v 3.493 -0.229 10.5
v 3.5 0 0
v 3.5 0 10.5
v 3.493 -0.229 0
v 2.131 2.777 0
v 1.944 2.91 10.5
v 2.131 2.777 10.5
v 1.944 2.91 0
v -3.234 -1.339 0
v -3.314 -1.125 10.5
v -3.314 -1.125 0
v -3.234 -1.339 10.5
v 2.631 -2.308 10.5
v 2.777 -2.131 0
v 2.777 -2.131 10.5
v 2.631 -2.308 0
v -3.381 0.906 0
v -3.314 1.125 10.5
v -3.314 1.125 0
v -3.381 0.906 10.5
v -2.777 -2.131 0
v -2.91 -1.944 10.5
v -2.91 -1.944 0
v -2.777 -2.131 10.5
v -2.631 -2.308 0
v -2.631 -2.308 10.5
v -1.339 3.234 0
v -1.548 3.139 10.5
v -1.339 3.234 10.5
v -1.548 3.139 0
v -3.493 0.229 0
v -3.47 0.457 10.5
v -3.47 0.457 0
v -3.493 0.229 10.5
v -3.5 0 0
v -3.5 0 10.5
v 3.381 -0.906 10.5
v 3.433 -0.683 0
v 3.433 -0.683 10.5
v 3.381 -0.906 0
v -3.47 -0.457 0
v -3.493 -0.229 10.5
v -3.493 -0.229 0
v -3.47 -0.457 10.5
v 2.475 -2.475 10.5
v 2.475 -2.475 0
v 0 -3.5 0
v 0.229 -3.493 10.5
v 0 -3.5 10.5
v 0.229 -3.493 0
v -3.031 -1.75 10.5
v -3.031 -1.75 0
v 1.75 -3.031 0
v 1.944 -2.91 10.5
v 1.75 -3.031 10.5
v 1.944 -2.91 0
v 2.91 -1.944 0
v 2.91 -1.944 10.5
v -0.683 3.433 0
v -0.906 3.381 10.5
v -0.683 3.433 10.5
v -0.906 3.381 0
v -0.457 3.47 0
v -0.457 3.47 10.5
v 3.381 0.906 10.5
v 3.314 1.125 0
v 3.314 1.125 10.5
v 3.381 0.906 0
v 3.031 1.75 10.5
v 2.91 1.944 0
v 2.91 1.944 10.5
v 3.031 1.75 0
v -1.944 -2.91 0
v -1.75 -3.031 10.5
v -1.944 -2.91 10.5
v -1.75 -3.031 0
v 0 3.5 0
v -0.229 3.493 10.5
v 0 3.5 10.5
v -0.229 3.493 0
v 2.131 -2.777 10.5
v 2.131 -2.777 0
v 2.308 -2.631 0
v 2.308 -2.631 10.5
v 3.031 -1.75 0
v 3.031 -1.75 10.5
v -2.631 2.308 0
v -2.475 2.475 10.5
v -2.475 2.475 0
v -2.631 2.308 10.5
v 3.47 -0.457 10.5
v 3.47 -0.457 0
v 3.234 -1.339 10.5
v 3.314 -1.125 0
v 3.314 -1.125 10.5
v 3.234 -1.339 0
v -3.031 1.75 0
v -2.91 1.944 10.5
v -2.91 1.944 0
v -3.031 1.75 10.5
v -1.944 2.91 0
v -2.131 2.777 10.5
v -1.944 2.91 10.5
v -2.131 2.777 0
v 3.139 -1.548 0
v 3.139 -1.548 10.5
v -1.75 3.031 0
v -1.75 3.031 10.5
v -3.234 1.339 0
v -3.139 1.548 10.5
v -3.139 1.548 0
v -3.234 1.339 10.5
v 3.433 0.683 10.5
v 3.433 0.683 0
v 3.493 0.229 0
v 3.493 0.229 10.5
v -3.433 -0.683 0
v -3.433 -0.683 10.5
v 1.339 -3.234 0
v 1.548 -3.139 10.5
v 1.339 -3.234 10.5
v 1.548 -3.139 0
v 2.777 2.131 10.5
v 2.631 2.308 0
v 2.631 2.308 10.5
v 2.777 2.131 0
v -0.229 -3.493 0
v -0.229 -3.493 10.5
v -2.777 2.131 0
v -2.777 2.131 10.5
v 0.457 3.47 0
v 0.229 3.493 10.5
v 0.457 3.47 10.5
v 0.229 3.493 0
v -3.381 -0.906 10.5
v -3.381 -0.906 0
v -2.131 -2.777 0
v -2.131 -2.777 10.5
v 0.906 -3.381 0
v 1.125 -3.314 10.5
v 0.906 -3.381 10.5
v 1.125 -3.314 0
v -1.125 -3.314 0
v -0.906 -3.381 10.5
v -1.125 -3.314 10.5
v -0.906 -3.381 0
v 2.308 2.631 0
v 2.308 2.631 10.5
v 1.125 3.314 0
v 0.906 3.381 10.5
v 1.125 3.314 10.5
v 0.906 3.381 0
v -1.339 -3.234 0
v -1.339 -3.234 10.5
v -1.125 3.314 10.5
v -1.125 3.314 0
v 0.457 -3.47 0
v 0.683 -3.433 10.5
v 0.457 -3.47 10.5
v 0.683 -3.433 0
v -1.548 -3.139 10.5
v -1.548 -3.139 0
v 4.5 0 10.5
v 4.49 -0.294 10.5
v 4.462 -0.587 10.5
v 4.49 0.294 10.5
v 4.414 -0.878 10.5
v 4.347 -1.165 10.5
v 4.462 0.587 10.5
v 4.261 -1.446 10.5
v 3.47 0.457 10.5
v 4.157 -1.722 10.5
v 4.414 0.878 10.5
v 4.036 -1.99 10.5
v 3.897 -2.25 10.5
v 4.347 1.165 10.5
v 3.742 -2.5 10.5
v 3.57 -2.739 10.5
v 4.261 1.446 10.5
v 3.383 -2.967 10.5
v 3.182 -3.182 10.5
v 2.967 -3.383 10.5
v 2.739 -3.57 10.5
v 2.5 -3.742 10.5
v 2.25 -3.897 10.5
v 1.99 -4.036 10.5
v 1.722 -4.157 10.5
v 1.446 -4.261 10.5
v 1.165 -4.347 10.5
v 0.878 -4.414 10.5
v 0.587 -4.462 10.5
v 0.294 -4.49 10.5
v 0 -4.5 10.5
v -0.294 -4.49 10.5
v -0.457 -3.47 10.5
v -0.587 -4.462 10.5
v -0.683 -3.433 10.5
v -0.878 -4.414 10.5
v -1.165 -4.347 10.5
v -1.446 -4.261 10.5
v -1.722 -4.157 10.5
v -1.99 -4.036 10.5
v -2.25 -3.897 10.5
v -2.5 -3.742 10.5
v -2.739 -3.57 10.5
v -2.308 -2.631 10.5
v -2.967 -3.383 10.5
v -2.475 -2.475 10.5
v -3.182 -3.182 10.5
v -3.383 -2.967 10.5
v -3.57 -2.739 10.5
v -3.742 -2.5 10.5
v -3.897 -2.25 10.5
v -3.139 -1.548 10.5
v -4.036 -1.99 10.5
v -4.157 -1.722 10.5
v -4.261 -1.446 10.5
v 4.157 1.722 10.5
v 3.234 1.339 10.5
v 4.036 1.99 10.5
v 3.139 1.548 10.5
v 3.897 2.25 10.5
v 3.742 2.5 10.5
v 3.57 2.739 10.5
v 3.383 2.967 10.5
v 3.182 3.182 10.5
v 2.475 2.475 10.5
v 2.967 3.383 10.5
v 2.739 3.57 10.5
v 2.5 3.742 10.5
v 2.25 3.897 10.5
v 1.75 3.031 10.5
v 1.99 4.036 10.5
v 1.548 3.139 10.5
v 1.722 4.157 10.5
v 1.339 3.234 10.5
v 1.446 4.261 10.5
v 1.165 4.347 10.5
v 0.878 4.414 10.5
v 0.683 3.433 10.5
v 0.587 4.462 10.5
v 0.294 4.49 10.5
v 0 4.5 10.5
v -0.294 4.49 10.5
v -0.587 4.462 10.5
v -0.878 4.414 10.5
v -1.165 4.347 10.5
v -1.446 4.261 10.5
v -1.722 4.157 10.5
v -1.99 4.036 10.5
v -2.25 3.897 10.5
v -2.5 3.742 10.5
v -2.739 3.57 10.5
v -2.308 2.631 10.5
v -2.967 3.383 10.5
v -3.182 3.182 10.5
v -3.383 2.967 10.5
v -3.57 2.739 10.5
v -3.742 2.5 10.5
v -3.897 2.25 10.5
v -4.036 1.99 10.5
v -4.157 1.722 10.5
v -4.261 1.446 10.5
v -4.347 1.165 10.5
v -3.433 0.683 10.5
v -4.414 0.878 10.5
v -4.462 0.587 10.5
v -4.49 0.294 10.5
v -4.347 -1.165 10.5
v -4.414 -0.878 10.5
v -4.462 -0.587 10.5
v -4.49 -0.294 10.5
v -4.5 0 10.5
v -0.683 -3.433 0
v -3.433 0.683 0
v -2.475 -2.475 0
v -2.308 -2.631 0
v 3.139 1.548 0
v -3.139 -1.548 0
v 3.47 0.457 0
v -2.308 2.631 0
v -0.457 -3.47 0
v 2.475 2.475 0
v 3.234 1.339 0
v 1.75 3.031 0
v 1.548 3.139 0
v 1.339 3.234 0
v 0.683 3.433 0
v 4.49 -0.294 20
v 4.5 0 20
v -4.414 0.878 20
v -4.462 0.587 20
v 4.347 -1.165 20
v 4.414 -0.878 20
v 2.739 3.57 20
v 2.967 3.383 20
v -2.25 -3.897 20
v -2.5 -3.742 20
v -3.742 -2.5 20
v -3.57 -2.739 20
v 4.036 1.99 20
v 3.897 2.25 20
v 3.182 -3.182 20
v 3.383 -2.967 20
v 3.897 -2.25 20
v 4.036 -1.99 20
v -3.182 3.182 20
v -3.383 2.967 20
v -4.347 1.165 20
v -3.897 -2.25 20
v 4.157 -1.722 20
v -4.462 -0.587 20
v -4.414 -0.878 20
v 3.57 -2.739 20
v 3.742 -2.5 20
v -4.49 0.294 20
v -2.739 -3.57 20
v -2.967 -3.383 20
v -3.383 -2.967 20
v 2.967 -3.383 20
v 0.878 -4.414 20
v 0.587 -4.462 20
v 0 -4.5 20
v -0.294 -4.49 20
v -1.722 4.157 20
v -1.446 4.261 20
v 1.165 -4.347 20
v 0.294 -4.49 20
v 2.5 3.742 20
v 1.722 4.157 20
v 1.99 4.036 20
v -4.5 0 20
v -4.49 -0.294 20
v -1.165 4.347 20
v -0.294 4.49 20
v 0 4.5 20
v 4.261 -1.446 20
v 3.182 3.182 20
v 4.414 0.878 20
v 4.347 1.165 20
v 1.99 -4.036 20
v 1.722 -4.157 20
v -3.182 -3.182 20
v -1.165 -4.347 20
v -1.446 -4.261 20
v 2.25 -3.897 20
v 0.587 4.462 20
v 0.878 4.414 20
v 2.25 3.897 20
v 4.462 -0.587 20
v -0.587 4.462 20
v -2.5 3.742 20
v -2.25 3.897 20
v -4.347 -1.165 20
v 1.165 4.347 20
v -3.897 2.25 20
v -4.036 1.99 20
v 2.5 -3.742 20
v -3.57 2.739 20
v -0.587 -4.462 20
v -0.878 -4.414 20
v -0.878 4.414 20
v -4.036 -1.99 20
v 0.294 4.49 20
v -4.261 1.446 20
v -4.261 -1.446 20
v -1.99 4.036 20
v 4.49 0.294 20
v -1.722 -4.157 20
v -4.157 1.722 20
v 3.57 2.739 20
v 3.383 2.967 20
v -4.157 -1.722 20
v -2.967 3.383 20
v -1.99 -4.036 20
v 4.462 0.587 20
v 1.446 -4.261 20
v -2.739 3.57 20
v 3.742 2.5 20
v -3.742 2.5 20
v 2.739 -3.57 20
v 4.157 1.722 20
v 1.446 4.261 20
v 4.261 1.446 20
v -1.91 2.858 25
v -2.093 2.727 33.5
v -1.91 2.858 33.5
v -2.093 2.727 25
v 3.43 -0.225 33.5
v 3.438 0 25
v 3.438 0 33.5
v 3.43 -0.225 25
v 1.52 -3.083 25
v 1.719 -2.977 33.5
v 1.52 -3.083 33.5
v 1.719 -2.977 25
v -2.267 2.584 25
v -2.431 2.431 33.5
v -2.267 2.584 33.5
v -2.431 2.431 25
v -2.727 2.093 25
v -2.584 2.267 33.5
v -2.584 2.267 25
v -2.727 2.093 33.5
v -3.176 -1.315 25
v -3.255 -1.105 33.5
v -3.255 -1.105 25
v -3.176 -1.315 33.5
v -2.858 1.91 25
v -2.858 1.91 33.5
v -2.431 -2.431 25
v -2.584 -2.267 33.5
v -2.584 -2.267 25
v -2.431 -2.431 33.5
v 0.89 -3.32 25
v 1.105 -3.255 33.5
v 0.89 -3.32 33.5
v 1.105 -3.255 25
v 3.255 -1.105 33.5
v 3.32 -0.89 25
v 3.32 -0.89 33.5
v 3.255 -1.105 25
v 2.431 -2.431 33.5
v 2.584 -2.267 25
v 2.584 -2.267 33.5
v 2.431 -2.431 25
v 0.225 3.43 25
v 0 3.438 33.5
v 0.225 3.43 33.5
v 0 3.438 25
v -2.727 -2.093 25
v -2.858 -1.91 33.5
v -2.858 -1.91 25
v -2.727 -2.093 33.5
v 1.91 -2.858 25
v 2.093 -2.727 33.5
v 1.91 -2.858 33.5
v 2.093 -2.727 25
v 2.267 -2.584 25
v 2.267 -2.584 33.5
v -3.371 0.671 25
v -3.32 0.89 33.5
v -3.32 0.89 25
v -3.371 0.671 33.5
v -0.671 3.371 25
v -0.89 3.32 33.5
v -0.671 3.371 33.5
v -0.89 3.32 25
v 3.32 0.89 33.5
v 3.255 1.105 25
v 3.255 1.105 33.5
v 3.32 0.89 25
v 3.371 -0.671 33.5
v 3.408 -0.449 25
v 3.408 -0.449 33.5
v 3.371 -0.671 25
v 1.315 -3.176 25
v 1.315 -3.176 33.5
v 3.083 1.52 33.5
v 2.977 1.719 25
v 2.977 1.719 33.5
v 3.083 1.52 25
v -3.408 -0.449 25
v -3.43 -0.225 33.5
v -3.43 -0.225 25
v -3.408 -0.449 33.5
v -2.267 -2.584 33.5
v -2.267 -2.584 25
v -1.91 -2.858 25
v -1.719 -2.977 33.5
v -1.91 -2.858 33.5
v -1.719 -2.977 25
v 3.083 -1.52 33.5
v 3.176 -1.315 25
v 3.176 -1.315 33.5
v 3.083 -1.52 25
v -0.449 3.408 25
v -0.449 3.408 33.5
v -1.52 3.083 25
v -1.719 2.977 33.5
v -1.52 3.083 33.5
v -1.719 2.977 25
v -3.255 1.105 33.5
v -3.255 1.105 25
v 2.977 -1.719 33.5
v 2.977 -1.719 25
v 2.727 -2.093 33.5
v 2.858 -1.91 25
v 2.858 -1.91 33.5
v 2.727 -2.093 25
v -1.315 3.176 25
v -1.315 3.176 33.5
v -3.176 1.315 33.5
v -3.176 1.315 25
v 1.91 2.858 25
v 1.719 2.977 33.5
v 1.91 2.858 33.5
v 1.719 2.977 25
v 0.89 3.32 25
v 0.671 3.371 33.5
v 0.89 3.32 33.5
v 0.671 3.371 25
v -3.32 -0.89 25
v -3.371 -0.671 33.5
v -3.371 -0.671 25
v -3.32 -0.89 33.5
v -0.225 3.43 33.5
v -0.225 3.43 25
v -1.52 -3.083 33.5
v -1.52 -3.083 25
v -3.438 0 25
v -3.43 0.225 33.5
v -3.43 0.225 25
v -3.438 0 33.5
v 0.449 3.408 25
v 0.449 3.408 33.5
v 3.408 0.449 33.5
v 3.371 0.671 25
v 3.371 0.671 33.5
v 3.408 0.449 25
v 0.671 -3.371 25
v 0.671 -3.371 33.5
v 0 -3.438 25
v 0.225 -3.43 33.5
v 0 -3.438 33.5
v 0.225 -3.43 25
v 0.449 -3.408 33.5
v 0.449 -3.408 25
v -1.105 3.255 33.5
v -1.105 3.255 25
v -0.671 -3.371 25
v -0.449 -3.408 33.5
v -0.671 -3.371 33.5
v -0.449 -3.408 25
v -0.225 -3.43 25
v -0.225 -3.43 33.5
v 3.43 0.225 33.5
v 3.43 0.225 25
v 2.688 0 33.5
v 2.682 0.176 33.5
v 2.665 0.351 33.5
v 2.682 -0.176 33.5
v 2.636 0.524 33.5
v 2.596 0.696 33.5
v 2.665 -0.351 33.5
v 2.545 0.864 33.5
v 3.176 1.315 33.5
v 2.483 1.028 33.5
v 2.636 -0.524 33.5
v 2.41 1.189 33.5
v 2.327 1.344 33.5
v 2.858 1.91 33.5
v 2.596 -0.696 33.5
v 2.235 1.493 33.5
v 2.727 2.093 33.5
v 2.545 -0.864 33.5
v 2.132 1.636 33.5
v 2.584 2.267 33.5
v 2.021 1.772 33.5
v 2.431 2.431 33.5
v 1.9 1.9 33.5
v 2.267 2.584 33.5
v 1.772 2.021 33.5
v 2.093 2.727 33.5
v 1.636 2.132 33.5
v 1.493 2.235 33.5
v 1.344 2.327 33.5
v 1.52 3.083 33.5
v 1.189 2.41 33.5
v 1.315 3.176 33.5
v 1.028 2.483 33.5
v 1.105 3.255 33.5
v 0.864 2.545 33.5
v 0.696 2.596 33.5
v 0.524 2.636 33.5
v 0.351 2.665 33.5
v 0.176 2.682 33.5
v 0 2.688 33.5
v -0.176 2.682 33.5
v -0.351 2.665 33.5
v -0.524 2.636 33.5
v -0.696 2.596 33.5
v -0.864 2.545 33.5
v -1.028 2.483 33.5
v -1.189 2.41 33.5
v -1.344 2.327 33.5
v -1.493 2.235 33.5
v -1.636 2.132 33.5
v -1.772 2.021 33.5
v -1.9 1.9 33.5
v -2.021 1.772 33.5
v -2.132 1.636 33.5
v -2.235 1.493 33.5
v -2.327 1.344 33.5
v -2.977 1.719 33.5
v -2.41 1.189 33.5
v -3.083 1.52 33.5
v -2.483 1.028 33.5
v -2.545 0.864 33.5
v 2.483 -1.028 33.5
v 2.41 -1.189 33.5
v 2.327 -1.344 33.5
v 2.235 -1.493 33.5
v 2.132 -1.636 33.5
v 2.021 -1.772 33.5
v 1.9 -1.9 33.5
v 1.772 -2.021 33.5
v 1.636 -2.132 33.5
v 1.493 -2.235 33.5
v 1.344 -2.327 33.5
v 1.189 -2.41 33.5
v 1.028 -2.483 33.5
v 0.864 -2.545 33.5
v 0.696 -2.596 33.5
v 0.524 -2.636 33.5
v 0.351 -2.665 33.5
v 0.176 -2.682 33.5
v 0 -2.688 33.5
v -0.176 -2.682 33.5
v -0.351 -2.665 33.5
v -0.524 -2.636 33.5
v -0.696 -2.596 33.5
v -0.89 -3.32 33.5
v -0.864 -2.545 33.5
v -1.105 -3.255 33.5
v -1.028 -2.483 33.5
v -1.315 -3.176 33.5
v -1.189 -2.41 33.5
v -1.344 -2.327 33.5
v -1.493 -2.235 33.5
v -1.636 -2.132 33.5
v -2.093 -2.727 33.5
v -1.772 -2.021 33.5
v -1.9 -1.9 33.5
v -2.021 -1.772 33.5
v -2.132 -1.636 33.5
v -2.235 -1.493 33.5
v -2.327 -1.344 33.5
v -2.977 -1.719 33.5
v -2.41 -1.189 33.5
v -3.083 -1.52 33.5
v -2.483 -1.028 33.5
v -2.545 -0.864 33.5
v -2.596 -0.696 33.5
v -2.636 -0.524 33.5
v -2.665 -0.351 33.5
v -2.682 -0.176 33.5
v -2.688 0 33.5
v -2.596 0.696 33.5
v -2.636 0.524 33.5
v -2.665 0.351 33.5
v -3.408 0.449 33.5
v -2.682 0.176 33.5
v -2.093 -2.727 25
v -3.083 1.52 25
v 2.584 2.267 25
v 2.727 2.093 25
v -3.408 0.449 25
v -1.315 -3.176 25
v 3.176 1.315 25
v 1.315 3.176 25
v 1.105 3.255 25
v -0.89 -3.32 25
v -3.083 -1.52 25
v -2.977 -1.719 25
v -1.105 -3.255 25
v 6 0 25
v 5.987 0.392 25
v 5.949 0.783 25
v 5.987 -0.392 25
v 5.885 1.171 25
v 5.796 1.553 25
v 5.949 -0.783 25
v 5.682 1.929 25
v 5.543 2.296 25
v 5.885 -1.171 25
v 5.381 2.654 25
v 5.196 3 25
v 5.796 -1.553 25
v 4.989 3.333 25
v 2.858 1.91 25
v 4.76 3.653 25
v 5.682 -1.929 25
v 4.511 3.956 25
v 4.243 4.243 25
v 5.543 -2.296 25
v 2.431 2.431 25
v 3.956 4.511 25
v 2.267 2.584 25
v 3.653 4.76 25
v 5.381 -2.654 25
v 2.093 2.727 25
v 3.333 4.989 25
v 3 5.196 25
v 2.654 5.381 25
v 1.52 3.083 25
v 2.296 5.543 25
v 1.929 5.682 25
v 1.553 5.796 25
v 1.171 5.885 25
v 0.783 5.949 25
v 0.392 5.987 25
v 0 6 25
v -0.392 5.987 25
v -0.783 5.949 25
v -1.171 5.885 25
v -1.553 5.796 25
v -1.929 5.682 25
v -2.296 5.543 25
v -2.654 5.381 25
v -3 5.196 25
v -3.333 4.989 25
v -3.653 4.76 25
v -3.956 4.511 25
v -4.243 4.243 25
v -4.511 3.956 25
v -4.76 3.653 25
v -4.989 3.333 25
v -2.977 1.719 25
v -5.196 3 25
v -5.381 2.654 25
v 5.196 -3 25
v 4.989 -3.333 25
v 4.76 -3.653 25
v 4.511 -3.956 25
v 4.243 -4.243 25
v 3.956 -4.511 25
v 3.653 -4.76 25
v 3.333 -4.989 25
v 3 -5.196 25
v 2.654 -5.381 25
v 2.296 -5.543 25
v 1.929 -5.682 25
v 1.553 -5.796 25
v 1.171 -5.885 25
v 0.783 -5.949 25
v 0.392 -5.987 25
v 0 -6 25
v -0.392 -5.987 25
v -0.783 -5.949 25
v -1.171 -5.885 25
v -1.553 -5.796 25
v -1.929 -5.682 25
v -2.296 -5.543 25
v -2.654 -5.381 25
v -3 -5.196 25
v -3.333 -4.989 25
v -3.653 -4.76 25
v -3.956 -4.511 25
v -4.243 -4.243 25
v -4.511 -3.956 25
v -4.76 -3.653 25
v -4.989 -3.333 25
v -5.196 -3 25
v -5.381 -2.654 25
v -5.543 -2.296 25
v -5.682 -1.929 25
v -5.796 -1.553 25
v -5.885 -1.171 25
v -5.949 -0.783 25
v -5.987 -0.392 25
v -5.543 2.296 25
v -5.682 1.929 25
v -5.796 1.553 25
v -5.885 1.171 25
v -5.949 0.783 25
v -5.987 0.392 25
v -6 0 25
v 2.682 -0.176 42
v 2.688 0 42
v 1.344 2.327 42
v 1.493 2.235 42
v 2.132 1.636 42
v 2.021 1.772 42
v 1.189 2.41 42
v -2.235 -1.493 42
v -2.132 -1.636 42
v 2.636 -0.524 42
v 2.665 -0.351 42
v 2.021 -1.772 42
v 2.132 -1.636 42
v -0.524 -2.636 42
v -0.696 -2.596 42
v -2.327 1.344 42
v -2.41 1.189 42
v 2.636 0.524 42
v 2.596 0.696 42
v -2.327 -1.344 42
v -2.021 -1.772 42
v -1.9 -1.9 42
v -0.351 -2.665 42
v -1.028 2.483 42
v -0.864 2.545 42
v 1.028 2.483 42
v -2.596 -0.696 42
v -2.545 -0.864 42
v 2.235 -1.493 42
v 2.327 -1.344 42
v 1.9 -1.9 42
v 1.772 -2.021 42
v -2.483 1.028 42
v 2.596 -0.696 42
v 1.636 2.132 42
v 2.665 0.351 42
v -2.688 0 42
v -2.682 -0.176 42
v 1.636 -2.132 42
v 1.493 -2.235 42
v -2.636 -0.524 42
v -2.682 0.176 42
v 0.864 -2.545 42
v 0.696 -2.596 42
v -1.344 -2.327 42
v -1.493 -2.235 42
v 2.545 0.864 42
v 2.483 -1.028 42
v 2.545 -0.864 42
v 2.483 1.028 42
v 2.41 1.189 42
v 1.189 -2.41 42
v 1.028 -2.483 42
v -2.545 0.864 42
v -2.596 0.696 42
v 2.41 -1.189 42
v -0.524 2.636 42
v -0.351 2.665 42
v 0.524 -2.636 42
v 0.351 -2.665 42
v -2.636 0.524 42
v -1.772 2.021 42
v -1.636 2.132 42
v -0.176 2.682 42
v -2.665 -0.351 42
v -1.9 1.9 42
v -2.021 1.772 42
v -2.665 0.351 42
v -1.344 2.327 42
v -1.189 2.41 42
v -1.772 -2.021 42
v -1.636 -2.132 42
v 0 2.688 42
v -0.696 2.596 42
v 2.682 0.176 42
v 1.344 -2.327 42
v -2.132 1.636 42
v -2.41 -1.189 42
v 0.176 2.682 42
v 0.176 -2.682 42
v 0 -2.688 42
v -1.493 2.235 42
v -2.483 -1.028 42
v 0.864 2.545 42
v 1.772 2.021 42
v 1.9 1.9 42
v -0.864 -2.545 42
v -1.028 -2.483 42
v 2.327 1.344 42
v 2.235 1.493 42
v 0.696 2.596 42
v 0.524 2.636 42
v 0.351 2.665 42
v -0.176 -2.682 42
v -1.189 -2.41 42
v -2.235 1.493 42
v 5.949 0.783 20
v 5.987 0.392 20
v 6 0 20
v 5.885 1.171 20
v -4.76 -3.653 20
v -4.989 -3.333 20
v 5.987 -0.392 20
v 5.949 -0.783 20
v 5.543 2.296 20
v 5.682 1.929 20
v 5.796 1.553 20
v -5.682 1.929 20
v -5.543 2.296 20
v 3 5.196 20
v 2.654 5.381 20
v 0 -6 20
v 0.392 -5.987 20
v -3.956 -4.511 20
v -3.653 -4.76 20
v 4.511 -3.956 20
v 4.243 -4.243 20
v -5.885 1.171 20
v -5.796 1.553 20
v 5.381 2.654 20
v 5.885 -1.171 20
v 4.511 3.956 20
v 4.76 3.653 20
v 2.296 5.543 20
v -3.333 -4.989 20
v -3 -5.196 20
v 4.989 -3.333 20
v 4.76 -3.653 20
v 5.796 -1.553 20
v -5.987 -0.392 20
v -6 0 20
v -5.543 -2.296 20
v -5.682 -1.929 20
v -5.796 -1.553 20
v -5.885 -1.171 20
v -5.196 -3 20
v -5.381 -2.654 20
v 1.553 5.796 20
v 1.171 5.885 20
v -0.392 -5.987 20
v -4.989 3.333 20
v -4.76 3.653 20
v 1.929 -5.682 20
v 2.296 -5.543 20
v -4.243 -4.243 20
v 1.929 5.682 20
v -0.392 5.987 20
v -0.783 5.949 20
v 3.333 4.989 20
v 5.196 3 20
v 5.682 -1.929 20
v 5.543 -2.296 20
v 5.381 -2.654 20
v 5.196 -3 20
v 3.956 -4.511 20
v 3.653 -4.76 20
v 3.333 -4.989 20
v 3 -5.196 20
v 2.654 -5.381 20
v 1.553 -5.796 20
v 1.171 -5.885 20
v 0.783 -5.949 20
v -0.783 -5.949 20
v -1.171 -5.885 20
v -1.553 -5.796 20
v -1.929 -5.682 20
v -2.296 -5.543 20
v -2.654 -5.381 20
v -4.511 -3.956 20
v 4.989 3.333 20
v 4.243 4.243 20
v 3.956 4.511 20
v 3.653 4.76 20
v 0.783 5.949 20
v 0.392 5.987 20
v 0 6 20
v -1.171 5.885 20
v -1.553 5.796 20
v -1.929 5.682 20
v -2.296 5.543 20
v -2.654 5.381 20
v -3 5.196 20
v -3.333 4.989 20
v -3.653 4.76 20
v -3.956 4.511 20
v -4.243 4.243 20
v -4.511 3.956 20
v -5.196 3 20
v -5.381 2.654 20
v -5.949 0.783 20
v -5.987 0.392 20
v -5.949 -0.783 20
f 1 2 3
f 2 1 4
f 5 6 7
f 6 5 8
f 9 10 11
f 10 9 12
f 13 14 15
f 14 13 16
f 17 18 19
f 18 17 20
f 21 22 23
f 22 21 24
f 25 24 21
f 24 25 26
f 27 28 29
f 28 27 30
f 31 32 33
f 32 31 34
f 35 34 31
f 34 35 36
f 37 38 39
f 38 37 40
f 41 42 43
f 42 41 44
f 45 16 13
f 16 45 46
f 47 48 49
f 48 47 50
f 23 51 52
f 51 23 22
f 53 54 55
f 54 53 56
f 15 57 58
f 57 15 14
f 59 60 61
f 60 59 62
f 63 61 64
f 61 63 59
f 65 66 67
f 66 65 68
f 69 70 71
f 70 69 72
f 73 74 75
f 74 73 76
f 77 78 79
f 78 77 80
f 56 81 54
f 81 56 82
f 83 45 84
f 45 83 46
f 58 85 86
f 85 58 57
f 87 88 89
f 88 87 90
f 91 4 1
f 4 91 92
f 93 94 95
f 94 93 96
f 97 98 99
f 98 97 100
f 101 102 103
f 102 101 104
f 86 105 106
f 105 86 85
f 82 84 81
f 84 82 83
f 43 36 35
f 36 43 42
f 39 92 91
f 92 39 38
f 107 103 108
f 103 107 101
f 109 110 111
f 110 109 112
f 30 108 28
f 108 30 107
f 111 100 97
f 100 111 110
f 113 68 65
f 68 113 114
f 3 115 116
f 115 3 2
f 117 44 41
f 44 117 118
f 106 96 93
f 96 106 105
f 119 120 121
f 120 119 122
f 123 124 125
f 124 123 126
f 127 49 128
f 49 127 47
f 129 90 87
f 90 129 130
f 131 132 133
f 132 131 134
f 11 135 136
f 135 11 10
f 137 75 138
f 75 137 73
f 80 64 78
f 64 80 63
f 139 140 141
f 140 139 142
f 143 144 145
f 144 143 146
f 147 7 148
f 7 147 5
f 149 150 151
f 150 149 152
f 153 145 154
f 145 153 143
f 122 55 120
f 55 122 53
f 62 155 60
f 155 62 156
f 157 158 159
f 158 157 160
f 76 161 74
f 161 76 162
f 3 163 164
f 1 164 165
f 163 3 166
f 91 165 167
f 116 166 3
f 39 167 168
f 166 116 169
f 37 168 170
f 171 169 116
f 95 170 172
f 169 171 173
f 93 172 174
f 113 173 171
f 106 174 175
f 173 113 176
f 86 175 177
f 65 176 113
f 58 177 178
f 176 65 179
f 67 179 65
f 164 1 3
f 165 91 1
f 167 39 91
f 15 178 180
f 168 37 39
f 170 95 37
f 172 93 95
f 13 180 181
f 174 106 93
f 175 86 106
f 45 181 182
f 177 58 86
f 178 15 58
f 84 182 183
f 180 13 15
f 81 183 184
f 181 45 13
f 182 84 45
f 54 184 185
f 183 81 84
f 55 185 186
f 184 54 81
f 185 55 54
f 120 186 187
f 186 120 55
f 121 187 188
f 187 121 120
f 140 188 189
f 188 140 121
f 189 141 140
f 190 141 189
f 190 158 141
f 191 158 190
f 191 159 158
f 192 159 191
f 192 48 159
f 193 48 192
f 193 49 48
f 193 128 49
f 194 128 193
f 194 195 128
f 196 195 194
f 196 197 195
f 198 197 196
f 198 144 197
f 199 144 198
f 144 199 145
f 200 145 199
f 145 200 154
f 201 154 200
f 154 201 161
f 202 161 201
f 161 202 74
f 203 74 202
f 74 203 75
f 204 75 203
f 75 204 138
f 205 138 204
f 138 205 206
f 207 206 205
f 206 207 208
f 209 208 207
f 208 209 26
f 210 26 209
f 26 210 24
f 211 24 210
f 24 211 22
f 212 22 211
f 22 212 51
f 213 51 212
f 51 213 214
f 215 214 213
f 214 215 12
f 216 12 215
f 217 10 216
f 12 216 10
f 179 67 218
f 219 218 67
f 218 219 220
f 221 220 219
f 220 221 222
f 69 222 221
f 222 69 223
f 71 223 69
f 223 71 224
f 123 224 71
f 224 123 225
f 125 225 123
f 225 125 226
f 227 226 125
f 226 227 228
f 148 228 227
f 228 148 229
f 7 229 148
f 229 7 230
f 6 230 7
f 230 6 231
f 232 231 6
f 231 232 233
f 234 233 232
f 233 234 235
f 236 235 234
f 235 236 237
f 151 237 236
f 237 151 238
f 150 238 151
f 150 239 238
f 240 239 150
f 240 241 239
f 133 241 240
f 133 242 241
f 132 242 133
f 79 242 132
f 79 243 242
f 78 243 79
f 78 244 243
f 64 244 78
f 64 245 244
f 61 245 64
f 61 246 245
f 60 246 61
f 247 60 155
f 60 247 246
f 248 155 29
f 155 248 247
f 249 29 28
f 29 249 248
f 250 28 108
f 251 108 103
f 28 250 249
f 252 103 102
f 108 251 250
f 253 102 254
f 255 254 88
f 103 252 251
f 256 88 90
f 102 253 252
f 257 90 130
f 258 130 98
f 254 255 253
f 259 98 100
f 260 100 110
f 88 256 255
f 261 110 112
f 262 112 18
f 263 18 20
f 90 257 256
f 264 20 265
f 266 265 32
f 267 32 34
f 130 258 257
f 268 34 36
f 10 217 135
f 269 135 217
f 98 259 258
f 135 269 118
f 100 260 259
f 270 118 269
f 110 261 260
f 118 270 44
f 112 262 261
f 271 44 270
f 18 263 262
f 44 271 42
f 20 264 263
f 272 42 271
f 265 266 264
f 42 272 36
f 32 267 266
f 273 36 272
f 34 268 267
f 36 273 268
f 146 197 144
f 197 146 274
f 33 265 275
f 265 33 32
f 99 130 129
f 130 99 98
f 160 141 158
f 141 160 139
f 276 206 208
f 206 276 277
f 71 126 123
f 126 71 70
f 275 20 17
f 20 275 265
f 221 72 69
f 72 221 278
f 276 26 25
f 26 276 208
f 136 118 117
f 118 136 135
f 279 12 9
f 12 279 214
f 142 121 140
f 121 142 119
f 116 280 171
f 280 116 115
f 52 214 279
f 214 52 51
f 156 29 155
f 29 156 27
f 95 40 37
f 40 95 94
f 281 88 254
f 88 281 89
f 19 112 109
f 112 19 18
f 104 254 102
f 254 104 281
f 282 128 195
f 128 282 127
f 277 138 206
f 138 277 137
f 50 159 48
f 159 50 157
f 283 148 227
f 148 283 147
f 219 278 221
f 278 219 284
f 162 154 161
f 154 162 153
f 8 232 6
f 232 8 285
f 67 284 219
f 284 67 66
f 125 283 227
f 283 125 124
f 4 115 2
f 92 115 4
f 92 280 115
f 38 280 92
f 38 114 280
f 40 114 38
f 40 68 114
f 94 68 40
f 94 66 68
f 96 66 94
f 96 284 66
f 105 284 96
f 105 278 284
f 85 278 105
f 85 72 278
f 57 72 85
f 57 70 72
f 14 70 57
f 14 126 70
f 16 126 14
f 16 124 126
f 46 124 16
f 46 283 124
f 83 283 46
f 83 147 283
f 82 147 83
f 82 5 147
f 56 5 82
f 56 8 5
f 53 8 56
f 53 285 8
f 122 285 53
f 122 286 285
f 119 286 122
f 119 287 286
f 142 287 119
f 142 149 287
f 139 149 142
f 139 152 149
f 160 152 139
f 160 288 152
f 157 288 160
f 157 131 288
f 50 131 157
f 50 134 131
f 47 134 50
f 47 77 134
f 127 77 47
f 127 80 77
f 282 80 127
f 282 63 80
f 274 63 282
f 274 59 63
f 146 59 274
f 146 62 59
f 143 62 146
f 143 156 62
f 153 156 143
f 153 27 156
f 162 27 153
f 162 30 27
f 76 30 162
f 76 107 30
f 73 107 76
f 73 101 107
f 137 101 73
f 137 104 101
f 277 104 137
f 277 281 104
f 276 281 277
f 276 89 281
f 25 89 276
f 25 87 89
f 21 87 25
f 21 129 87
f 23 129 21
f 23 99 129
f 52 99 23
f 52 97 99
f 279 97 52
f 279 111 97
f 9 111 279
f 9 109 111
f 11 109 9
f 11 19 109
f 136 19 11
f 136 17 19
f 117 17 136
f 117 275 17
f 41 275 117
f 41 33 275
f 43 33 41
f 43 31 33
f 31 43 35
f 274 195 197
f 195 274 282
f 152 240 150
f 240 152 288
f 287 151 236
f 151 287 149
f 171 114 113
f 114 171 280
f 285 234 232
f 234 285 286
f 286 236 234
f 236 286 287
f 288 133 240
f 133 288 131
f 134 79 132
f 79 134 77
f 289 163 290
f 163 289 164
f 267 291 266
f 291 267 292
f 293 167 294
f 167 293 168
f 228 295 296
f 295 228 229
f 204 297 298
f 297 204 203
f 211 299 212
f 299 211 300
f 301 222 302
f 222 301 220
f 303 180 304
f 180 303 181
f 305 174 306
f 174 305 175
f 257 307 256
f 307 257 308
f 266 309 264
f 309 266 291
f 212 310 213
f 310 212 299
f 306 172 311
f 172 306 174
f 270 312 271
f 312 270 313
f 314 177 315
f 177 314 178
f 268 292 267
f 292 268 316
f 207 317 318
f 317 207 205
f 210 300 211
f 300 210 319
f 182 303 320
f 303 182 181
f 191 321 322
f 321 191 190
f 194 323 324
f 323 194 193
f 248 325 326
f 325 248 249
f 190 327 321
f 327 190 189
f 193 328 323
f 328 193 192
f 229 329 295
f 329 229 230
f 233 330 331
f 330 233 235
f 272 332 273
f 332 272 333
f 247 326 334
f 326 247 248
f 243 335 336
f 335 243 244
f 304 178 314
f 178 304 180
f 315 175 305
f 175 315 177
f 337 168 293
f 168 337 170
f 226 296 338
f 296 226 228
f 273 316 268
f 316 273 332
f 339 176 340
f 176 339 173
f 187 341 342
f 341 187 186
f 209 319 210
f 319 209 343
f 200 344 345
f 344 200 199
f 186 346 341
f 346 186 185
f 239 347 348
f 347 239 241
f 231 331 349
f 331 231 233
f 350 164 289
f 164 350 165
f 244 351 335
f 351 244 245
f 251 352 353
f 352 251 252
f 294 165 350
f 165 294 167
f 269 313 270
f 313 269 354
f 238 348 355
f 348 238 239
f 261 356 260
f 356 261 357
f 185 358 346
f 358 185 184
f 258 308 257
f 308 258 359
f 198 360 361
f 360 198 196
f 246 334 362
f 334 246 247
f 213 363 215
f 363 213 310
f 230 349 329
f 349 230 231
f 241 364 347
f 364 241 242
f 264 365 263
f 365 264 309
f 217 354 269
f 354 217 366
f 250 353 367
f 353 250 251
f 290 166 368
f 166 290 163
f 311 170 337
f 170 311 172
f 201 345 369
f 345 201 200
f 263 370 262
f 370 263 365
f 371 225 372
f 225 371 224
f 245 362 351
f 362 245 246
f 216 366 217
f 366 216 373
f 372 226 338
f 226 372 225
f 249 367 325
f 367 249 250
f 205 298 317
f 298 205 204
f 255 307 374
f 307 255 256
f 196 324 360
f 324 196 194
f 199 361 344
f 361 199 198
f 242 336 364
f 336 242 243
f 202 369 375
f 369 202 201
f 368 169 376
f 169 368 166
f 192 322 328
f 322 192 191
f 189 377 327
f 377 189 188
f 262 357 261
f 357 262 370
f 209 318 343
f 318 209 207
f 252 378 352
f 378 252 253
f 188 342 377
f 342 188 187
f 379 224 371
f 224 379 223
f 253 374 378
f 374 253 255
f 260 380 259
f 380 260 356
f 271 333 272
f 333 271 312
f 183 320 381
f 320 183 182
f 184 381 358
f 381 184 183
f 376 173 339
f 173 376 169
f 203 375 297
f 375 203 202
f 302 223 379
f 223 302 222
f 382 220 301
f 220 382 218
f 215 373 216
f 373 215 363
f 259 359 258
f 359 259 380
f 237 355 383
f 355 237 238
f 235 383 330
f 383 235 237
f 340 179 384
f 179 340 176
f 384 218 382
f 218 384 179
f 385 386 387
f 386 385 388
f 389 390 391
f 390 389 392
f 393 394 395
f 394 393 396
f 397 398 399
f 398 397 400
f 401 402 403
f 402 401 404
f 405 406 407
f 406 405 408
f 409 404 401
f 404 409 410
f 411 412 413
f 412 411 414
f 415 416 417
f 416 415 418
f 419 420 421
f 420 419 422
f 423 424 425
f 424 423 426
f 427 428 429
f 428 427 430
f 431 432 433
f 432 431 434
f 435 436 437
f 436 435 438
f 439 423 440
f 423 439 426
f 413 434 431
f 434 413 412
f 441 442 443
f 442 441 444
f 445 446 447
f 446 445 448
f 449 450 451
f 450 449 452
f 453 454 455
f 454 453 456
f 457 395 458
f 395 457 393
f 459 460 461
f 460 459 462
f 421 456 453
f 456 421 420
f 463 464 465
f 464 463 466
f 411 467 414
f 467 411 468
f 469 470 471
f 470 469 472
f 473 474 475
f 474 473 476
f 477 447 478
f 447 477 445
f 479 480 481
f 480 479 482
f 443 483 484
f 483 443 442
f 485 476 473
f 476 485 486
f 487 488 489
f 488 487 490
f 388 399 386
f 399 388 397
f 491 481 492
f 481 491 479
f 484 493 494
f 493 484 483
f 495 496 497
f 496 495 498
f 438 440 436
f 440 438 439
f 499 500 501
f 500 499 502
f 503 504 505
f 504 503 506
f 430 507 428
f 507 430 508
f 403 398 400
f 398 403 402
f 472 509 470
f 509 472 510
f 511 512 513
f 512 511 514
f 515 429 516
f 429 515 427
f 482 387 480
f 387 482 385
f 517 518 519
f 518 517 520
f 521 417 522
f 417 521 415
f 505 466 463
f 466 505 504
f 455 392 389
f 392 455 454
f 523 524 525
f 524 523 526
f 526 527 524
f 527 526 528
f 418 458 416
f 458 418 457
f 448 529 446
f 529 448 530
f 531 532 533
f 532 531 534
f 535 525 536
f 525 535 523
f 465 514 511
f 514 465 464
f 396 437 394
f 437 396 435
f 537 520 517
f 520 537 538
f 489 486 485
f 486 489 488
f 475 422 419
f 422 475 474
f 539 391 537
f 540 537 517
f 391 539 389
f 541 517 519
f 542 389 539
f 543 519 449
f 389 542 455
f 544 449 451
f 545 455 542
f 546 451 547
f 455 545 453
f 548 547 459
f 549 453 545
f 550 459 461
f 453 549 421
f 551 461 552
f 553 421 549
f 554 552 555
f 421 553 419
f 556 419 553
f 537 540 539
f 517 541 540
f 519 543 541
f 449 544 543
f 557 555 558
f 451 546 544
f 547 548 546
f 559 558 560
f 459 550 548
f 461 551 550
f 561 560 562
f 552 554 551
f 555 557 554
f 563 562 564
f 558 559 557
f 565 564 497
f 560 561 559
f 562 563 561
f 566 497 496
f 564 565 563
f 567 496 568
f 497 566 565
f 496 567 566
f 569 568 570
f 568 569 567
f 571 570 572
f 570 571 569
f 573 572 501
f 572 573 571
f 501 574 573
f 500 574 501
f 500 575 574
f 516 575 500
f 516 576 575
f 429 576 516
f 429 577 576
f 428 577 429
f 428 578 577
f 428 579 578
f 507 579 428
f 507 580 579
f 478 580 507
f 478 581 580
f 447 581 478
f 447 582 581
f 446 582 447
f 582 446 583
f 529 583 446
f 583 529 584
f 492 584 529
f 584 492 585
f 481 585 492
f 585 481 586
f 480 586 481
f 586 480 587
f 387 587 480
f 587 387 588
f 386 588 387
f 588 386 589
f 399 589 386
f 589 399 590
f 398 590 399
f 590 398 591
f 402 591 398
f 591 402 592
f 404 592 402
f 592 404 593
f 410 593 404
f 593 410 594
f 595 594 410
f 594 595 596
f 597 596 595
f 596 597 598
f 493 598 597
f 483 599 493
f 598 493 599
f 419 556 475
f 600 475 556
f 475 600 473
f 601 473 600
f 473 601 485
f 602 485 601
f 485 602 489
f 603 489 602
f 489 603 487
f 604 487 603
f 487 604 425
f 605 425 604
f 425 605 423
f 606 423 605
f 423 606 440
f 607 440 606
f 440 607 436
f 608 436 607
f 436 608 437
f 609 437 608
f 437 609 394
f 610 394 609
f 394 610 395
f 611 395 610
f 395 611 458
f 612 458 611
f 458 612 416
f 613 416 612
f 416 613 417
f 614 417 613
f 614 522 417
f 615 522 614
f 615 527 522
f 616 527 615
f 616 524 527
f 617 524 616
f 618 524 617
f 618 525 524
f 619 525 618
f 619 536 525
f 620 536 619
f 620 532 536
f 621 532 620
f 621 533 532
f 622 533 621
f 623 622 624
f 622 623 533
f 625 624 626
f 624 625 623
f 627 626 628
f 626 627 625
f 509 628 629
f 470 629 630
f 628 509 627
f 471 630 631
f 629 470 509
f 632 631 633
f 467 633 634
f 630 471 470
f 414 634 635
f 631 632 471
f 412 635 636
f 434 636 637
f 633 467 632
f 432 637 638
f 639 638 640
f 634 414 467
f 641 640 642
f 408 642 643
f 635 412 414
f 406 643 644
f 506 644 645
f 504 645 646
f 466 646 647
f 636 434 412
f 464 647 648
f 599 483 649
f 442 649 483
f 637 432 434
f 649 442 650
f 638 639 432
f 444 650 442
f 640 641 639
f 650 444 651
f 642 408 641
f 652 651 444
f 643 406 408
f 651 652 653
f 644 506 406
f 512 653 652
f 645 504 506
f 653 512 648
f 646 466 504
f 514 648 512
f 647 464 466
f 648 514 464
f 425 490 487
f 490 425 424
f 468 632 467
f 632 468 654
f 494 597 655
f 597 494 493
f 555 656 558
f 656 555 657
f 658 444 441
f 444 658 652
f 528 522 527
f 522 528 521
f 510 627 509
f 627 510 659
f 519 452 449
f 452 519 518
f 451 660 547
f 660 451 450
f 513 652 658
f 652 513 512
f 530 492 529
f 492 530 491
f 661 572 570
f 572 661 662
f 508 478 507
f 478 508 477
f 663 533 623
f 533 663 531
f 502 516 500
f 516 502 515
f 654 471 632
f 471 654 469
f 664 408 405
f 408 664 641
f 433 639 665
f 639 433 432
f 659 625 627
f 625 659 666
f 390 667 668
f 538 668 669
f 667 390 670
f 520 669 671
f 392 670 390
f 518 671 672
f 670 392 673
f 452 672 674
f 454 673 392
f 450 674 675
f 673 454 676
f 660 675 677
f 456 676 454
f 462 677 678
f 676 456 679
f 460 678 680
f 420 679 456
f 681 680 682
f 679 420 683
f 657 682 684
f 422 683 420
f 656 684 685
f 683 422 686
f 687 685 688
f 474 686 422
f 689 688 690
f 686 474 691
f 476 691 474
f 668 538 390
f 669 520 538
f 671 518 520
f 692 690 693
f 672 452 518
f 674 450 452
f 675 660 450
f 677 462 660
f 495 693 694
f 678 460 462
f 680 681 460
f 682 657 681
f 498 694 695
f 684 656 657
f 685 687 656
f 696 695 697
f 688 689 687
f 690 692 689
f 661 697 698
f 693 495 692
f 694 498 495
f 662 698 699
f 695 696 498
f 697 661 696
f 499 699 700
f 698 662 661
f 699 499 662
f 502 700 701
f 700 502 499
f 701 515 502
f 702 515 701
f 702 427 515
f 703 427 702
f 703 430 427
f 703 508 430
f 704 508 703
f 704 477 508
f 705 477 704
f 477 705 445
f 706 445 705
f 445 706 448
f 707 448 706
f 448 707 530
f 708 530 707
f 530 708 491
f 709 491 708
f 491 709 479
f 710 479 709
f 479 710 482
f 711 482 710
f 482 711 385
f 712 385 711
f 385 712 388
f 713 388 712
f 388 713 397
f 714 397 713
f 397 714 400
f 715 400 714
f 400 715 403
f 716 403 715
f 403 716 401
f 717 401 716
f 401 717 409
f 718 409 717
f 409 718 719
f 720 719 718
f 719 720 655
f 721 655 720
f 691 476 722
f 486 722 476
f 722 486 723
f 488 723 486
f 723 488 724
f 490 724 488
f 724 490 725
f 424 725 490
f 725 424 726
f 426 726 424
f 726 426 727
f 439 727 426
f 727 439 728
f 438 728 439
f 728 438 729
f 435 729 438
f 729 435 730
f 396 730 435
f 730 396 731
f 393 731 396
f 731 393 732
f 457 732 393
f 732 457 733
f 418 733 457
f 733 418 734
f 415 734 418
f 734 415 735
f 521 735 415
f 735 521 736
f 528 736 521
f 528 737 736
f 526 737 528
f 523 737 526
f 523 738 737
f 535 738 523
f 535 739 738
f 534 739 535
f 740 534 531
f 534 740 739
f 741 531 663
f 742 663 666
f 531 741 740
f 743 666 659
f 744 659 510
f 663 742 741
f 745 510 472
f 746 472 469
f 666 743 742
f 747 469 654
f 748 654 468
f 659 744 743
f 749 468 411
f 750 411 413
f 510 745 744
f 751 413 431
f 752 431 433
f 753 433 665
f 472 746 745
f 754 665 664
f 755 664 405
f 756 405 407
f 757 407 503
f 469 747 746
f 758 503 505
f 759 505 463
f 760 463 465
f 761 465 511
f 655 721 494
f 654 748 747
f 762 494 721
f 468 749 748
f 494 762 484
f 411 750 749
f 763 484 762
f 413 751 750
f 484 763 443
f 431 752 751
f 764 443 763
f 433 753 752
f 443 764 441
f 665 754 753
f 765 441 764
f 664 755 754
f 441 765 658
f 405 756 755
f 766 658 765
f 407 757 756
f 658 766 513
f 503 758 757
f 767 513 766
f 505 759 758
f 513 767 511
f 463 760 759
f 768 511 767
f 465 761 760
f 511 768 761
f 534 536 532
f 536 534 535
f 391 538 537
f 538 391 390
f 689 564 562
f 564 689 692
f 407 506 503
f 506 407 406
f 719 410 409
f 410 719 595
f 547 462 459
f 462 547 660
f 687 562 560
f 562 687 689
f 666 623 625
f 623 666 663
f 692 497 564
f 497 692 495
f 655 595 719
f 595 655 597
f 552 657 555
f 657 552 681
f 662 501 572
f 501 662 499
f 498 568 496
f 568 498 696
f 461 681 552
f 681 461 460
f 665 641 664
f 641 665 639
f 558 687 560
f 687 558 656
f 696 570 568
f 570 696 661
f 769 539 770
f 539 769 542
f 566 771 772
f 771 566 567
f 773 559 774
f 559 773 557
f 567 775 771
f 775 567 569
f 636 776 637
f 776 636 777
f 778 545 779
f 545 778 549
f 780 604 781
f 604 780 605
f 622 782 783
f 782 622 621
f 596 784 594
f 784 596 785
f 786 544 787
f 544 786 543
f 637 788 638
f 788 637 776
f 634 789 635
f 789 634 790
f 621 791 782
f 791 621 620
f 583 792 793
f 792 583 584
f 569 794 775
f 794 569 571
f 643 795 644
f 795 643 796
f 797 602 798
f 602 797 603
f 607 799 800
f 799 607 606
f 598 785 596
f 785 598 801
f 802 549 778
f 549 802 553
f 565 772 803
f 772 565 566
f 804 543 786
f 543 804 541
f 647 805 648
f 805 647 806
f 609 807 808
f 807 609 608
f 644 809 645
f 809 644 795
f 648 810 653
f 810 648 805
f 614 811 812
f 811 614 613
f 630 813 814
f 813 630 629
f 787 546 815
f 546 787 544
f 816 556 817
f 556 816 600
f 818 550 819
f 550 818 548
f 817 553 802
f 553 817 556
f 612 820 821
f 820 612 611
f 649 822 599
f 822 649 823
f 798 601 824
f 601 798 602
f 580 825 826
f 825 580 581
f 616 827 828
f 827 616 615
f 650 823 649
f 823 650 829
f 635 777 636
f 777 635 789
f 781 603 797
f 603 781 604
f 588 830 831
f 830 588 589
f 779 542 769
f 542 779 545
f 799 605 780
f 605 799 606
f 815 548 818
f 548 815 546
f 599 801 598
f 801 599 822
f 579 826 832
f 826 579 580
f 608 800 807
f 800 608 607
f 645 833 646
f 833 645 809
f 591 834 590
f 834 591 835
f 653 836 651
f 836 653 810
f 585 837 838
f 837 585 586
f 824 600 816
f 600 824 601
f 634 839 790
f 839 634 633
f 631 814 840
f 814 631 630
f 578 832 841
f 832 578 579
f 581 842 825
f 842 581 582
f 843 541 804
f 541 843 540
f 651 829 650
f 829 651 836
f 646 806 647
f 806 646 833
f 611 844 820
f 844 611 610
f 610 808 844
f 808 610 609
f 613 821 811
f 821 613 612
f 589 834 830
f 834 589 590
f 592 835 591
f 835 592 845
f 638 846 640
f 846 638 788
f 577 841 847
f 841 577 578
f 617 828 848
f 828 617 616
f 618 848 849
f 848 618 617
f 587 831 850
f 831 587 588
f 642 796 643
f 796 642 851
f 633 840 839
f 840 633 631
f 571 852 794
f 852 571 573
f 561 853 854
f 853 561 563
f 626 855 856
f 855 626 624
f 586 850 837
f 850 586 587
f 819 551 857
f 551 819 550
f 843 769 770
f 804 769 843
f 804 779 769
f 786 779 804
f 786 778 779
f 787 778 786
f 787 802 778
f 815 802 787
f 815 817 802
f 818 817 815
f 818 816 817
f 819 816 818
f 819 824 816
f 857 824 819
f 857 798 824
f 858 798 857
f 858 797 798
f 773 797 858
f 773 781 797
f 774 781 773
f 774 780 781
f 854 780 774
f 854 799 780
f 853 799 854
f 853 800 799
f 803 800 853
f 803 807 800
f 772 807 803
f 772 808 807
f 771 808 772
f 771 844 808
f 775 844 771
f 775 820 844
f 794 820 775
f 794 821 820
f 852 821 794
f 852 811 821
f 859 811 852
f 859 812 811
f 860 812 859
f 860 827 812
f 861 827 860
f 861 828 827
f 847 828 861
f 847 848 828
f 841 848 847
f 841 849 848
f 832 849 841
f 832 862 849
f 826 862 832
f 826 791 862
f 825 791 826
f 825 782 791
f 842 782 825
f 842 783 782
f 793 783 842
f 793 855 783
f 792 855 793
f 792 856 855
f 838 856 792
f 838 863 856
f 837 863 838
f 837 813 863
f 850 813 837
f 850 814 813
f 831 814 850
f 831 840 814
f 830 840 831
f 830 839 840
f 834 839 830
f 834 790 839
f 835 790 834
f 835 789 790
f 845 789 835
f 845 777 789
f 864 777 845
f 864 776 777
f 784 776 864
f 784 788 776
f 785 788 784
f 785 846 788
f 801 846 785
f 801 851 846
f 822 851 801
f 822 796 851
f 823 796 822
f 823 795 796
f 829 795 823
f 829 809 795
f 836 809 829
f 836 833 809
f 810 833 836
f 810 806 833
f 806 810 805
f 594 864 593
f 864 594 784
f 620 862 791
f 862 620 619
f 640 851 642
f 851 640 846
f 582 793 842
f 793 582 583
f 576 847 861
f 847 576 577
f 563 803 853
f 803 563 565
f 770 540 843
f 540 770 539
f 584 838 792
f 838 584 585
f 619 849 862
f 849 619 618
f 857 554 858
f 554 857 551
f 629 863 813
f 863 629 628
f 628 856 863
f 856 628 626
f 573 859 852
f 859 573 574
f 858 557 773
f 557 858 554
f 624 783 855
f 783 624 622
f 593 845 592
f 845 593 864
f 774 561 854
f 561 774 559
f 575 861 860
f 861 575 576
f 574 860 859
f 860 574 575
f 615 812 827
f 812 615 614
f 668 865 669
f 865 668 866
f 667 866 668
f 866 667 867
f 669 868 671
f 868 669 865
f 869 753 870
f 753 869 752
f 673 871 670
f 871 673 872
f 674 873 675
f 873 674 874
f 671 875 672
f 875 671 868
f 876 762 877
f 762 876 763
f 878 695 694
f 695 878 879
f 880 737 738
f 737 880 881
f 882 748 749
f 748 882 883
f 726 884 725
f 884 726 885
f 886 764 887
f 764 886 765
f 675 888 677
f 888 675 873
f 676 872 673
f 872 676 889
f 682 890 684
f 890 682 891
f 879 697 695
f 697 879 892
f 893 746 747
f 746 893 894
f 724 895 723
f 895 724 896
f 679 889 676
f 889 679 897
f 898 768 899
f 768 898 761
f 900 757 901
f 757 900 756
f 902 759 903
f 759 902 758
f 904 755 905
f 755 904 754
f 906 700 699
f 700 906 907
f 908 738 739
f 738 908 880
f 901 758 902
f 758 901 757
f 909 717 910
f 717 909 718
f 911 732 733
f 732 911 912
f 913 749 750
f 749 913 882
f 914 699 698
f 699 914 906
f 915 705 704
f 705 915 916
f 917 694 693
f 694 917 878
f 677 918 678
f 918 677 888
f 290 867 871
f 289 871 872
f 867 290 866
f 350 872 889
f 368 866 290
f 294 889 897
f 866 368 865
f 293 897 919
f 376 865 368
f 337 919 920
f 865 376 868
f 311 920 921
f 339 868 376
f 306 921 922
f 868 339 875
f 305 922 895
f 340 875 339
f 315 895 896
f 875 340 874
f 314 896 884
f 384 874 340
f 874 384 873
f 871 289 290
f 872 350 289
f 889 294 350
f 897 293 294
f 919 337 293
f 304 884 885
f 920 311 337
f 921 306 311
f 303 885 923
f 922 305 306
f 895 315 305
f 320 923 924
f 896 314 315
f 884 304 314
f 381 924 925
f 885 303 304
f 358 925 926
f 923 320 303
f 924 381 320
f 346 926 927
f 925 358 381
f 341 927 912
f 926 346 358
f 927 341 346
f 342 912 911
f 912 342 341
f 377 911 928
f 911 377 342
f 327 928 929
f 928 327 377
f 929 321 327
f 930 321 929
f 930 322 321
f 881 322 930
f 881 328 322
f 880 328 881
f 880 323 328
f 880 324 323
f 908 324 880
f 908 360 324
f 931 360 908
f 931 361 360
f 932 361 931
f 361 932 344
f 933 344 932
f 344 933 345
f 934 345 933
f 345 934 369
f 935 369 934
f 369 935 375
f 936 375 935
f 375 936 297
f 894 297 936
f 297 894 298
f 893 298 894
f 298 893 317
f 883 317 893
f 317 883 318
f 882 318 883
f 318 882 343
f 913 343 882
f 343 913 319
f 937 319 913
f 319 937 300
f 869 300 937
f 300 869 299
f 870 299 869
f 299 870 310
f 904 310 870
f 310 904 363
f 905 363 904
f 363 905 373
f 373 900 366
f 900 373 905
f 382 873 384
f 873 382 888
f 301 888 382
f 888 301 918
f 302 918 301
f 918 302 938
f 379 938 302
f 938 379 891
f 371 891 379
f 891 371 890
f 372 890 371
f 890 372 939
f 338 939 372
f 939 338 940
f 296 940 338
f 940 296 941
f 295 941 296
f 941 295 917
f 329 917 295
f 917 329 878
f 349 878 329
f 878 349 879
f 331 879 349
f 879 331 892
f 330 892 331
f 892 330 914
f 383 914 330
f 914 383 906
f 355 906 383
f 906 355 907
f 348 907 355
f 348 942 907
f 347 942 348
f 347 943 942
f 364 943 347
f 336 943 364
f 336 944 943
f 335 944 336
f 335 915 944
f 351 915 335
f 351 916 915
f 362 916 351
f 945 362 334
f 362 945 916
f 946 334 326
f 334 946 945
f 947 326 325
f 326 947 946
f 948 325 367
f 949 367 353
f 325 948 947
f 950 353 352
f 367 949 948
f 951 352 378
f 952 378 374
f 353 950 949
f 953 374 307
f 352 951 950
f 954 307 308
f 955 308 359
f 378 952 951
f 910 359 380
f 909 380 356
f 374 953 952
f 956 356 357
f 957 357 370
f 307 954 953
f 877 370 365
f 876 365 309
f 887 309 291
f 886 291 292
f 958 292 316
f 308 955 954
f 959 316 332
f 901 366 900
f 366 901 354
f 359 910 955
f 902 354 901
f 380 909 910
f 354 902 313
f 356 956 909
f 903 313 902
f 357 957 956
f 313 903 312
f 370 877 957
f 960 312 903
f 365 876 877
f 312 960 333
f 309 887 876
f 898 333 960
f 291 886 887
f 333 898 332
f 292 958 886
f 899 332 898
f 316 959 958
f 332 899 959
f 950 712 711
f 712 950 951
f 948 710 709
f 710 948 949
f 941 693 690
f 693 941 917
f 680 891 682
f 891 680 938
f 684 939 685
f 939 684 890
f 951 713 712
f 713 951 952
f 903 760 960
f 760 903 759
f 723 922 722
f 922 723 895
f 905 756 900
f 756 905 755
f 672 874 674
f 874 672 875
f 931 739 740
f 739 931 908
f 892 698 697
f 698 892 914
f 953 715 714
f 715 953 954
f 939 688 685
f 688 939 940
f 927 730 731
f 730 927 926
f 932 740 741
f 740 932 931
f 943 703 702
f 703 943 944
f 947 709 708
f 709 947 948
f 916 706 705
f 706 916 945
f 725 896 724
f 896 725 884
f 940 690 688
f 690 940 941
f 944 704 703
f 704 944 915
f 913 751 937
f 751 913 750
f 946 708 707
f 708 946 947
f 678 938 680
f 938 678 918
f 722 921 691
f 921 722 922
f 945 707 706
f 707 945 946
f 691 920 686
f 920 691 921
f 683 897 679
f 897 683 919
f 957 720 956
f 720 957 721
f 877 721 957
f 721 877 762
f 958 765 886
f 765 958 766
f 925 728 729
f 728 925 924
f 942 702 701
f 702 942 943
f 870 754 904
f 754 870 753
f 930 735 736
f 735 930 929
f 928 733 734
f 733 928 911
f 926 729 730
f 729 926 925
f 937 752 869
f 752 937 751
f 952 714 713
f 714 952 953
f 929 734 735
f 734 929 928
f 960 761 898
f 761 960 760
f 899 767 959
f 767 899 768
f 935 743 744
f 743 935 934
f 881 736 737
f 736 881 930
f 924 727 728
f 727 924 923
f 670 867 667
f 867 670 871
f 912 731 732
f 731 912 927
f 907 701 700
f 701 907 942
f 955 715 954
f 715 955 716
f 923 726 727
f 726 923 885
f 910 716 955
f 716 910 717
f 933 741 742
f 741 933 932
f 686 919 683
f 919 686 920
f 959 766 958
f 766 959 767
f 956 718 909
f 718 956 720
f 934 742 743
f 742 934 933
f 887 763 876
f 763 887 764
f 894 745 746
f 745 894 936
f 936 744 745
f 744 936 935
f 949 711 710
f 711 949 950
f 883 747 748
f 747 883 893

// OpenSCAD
// Straight hose-barb reducer: 8 mm tubing to 5 mm tubing
// Print orientation: standing upright along +Z, centred on the origin in X/Y.
// The two barbs at each end are stacked (one above the other) and may overlap slightly.

$fn = 96;

// ---------------- Dimensions (mm) ----------------
reducer_id      = 8;    // inner diameter of the 8 mm tubing
reducer_od      = 5;    // inner diameter of the 5 mm tubing
barb_count      = 2;    // number of barbs at each end (stacked)
barb_height_8   = 10;   // height of each 8 mm barb, from z = 0 to z = 20
barb_od_start_8 = 7.5;  // outer diameter of the 8 mm barbs at their bottom
barb_od_end_8   = 9.5;  // outer diameter of the 8 mm barbs at their top
barb_height_5   = 8;    // height of each 5 mm barb, from z = 25 to z = 41
barb_od_start_5 = 6.5;  // outer diameter of the 5 mm barbs at their bottom
barb_od_end_5   = 5.0;  // outer diameter of the 5 mm barbs at their top
collar_od       = 12;   // outer diameter of the cylindrical collar (z = 20 to 25)
eps             = 0.5;   // overshoot so cutters pass through faces

// Derived
reducer_length  = 41;   // overall length along Z
overlap         = 0.5;  // how far the stacked barbs overlap each other

// ---------------- Model ----------------
union() {
    // 8 mm tubing end: two barbs, stacked, from z = 0 to z = 20
    for (i = [0 : barb_count - 1]) {
        translate([0, 0, i * (barb_height_8 + overlap)])
            linear_extrude(height = barb_height_8 + overlap)
                circle(d = barb_od_start_8 + (barb_od_end_8 - barb_od_start_8) *
                       (i - 0.5 + 0.5 / barb_count));
    }

    // Cylindrical collar from z = 20 to z = 25
    translate([0, 0, 20])
        cylinder(h = 5, d = collar_od);

    // 5 mm tubing end: two barbs, stacked, from z = 25 to z = 41
    for (i = [0 : barb_count - 1]) {
        translate([0, 0, 25 + i * (barb_height_5 + overlap)])
            linear_extrude(height = barb_height_5 + overlap)
                circle(d = barb_od_start_5 + (barb_od_end_5 - barb_od_start_5) *
                       (i - 0.5 + 0.5 / barb_count));
    }
}

// ---------------- Bore ----------------
// A 3 mm bore runs straight through the full length of the part
translate([0, 0, -eps])
    rotate_extrude()
        translate([0, -1.5, 0])
            cube([reducer_length + 2 * eps, 3, 1]);
